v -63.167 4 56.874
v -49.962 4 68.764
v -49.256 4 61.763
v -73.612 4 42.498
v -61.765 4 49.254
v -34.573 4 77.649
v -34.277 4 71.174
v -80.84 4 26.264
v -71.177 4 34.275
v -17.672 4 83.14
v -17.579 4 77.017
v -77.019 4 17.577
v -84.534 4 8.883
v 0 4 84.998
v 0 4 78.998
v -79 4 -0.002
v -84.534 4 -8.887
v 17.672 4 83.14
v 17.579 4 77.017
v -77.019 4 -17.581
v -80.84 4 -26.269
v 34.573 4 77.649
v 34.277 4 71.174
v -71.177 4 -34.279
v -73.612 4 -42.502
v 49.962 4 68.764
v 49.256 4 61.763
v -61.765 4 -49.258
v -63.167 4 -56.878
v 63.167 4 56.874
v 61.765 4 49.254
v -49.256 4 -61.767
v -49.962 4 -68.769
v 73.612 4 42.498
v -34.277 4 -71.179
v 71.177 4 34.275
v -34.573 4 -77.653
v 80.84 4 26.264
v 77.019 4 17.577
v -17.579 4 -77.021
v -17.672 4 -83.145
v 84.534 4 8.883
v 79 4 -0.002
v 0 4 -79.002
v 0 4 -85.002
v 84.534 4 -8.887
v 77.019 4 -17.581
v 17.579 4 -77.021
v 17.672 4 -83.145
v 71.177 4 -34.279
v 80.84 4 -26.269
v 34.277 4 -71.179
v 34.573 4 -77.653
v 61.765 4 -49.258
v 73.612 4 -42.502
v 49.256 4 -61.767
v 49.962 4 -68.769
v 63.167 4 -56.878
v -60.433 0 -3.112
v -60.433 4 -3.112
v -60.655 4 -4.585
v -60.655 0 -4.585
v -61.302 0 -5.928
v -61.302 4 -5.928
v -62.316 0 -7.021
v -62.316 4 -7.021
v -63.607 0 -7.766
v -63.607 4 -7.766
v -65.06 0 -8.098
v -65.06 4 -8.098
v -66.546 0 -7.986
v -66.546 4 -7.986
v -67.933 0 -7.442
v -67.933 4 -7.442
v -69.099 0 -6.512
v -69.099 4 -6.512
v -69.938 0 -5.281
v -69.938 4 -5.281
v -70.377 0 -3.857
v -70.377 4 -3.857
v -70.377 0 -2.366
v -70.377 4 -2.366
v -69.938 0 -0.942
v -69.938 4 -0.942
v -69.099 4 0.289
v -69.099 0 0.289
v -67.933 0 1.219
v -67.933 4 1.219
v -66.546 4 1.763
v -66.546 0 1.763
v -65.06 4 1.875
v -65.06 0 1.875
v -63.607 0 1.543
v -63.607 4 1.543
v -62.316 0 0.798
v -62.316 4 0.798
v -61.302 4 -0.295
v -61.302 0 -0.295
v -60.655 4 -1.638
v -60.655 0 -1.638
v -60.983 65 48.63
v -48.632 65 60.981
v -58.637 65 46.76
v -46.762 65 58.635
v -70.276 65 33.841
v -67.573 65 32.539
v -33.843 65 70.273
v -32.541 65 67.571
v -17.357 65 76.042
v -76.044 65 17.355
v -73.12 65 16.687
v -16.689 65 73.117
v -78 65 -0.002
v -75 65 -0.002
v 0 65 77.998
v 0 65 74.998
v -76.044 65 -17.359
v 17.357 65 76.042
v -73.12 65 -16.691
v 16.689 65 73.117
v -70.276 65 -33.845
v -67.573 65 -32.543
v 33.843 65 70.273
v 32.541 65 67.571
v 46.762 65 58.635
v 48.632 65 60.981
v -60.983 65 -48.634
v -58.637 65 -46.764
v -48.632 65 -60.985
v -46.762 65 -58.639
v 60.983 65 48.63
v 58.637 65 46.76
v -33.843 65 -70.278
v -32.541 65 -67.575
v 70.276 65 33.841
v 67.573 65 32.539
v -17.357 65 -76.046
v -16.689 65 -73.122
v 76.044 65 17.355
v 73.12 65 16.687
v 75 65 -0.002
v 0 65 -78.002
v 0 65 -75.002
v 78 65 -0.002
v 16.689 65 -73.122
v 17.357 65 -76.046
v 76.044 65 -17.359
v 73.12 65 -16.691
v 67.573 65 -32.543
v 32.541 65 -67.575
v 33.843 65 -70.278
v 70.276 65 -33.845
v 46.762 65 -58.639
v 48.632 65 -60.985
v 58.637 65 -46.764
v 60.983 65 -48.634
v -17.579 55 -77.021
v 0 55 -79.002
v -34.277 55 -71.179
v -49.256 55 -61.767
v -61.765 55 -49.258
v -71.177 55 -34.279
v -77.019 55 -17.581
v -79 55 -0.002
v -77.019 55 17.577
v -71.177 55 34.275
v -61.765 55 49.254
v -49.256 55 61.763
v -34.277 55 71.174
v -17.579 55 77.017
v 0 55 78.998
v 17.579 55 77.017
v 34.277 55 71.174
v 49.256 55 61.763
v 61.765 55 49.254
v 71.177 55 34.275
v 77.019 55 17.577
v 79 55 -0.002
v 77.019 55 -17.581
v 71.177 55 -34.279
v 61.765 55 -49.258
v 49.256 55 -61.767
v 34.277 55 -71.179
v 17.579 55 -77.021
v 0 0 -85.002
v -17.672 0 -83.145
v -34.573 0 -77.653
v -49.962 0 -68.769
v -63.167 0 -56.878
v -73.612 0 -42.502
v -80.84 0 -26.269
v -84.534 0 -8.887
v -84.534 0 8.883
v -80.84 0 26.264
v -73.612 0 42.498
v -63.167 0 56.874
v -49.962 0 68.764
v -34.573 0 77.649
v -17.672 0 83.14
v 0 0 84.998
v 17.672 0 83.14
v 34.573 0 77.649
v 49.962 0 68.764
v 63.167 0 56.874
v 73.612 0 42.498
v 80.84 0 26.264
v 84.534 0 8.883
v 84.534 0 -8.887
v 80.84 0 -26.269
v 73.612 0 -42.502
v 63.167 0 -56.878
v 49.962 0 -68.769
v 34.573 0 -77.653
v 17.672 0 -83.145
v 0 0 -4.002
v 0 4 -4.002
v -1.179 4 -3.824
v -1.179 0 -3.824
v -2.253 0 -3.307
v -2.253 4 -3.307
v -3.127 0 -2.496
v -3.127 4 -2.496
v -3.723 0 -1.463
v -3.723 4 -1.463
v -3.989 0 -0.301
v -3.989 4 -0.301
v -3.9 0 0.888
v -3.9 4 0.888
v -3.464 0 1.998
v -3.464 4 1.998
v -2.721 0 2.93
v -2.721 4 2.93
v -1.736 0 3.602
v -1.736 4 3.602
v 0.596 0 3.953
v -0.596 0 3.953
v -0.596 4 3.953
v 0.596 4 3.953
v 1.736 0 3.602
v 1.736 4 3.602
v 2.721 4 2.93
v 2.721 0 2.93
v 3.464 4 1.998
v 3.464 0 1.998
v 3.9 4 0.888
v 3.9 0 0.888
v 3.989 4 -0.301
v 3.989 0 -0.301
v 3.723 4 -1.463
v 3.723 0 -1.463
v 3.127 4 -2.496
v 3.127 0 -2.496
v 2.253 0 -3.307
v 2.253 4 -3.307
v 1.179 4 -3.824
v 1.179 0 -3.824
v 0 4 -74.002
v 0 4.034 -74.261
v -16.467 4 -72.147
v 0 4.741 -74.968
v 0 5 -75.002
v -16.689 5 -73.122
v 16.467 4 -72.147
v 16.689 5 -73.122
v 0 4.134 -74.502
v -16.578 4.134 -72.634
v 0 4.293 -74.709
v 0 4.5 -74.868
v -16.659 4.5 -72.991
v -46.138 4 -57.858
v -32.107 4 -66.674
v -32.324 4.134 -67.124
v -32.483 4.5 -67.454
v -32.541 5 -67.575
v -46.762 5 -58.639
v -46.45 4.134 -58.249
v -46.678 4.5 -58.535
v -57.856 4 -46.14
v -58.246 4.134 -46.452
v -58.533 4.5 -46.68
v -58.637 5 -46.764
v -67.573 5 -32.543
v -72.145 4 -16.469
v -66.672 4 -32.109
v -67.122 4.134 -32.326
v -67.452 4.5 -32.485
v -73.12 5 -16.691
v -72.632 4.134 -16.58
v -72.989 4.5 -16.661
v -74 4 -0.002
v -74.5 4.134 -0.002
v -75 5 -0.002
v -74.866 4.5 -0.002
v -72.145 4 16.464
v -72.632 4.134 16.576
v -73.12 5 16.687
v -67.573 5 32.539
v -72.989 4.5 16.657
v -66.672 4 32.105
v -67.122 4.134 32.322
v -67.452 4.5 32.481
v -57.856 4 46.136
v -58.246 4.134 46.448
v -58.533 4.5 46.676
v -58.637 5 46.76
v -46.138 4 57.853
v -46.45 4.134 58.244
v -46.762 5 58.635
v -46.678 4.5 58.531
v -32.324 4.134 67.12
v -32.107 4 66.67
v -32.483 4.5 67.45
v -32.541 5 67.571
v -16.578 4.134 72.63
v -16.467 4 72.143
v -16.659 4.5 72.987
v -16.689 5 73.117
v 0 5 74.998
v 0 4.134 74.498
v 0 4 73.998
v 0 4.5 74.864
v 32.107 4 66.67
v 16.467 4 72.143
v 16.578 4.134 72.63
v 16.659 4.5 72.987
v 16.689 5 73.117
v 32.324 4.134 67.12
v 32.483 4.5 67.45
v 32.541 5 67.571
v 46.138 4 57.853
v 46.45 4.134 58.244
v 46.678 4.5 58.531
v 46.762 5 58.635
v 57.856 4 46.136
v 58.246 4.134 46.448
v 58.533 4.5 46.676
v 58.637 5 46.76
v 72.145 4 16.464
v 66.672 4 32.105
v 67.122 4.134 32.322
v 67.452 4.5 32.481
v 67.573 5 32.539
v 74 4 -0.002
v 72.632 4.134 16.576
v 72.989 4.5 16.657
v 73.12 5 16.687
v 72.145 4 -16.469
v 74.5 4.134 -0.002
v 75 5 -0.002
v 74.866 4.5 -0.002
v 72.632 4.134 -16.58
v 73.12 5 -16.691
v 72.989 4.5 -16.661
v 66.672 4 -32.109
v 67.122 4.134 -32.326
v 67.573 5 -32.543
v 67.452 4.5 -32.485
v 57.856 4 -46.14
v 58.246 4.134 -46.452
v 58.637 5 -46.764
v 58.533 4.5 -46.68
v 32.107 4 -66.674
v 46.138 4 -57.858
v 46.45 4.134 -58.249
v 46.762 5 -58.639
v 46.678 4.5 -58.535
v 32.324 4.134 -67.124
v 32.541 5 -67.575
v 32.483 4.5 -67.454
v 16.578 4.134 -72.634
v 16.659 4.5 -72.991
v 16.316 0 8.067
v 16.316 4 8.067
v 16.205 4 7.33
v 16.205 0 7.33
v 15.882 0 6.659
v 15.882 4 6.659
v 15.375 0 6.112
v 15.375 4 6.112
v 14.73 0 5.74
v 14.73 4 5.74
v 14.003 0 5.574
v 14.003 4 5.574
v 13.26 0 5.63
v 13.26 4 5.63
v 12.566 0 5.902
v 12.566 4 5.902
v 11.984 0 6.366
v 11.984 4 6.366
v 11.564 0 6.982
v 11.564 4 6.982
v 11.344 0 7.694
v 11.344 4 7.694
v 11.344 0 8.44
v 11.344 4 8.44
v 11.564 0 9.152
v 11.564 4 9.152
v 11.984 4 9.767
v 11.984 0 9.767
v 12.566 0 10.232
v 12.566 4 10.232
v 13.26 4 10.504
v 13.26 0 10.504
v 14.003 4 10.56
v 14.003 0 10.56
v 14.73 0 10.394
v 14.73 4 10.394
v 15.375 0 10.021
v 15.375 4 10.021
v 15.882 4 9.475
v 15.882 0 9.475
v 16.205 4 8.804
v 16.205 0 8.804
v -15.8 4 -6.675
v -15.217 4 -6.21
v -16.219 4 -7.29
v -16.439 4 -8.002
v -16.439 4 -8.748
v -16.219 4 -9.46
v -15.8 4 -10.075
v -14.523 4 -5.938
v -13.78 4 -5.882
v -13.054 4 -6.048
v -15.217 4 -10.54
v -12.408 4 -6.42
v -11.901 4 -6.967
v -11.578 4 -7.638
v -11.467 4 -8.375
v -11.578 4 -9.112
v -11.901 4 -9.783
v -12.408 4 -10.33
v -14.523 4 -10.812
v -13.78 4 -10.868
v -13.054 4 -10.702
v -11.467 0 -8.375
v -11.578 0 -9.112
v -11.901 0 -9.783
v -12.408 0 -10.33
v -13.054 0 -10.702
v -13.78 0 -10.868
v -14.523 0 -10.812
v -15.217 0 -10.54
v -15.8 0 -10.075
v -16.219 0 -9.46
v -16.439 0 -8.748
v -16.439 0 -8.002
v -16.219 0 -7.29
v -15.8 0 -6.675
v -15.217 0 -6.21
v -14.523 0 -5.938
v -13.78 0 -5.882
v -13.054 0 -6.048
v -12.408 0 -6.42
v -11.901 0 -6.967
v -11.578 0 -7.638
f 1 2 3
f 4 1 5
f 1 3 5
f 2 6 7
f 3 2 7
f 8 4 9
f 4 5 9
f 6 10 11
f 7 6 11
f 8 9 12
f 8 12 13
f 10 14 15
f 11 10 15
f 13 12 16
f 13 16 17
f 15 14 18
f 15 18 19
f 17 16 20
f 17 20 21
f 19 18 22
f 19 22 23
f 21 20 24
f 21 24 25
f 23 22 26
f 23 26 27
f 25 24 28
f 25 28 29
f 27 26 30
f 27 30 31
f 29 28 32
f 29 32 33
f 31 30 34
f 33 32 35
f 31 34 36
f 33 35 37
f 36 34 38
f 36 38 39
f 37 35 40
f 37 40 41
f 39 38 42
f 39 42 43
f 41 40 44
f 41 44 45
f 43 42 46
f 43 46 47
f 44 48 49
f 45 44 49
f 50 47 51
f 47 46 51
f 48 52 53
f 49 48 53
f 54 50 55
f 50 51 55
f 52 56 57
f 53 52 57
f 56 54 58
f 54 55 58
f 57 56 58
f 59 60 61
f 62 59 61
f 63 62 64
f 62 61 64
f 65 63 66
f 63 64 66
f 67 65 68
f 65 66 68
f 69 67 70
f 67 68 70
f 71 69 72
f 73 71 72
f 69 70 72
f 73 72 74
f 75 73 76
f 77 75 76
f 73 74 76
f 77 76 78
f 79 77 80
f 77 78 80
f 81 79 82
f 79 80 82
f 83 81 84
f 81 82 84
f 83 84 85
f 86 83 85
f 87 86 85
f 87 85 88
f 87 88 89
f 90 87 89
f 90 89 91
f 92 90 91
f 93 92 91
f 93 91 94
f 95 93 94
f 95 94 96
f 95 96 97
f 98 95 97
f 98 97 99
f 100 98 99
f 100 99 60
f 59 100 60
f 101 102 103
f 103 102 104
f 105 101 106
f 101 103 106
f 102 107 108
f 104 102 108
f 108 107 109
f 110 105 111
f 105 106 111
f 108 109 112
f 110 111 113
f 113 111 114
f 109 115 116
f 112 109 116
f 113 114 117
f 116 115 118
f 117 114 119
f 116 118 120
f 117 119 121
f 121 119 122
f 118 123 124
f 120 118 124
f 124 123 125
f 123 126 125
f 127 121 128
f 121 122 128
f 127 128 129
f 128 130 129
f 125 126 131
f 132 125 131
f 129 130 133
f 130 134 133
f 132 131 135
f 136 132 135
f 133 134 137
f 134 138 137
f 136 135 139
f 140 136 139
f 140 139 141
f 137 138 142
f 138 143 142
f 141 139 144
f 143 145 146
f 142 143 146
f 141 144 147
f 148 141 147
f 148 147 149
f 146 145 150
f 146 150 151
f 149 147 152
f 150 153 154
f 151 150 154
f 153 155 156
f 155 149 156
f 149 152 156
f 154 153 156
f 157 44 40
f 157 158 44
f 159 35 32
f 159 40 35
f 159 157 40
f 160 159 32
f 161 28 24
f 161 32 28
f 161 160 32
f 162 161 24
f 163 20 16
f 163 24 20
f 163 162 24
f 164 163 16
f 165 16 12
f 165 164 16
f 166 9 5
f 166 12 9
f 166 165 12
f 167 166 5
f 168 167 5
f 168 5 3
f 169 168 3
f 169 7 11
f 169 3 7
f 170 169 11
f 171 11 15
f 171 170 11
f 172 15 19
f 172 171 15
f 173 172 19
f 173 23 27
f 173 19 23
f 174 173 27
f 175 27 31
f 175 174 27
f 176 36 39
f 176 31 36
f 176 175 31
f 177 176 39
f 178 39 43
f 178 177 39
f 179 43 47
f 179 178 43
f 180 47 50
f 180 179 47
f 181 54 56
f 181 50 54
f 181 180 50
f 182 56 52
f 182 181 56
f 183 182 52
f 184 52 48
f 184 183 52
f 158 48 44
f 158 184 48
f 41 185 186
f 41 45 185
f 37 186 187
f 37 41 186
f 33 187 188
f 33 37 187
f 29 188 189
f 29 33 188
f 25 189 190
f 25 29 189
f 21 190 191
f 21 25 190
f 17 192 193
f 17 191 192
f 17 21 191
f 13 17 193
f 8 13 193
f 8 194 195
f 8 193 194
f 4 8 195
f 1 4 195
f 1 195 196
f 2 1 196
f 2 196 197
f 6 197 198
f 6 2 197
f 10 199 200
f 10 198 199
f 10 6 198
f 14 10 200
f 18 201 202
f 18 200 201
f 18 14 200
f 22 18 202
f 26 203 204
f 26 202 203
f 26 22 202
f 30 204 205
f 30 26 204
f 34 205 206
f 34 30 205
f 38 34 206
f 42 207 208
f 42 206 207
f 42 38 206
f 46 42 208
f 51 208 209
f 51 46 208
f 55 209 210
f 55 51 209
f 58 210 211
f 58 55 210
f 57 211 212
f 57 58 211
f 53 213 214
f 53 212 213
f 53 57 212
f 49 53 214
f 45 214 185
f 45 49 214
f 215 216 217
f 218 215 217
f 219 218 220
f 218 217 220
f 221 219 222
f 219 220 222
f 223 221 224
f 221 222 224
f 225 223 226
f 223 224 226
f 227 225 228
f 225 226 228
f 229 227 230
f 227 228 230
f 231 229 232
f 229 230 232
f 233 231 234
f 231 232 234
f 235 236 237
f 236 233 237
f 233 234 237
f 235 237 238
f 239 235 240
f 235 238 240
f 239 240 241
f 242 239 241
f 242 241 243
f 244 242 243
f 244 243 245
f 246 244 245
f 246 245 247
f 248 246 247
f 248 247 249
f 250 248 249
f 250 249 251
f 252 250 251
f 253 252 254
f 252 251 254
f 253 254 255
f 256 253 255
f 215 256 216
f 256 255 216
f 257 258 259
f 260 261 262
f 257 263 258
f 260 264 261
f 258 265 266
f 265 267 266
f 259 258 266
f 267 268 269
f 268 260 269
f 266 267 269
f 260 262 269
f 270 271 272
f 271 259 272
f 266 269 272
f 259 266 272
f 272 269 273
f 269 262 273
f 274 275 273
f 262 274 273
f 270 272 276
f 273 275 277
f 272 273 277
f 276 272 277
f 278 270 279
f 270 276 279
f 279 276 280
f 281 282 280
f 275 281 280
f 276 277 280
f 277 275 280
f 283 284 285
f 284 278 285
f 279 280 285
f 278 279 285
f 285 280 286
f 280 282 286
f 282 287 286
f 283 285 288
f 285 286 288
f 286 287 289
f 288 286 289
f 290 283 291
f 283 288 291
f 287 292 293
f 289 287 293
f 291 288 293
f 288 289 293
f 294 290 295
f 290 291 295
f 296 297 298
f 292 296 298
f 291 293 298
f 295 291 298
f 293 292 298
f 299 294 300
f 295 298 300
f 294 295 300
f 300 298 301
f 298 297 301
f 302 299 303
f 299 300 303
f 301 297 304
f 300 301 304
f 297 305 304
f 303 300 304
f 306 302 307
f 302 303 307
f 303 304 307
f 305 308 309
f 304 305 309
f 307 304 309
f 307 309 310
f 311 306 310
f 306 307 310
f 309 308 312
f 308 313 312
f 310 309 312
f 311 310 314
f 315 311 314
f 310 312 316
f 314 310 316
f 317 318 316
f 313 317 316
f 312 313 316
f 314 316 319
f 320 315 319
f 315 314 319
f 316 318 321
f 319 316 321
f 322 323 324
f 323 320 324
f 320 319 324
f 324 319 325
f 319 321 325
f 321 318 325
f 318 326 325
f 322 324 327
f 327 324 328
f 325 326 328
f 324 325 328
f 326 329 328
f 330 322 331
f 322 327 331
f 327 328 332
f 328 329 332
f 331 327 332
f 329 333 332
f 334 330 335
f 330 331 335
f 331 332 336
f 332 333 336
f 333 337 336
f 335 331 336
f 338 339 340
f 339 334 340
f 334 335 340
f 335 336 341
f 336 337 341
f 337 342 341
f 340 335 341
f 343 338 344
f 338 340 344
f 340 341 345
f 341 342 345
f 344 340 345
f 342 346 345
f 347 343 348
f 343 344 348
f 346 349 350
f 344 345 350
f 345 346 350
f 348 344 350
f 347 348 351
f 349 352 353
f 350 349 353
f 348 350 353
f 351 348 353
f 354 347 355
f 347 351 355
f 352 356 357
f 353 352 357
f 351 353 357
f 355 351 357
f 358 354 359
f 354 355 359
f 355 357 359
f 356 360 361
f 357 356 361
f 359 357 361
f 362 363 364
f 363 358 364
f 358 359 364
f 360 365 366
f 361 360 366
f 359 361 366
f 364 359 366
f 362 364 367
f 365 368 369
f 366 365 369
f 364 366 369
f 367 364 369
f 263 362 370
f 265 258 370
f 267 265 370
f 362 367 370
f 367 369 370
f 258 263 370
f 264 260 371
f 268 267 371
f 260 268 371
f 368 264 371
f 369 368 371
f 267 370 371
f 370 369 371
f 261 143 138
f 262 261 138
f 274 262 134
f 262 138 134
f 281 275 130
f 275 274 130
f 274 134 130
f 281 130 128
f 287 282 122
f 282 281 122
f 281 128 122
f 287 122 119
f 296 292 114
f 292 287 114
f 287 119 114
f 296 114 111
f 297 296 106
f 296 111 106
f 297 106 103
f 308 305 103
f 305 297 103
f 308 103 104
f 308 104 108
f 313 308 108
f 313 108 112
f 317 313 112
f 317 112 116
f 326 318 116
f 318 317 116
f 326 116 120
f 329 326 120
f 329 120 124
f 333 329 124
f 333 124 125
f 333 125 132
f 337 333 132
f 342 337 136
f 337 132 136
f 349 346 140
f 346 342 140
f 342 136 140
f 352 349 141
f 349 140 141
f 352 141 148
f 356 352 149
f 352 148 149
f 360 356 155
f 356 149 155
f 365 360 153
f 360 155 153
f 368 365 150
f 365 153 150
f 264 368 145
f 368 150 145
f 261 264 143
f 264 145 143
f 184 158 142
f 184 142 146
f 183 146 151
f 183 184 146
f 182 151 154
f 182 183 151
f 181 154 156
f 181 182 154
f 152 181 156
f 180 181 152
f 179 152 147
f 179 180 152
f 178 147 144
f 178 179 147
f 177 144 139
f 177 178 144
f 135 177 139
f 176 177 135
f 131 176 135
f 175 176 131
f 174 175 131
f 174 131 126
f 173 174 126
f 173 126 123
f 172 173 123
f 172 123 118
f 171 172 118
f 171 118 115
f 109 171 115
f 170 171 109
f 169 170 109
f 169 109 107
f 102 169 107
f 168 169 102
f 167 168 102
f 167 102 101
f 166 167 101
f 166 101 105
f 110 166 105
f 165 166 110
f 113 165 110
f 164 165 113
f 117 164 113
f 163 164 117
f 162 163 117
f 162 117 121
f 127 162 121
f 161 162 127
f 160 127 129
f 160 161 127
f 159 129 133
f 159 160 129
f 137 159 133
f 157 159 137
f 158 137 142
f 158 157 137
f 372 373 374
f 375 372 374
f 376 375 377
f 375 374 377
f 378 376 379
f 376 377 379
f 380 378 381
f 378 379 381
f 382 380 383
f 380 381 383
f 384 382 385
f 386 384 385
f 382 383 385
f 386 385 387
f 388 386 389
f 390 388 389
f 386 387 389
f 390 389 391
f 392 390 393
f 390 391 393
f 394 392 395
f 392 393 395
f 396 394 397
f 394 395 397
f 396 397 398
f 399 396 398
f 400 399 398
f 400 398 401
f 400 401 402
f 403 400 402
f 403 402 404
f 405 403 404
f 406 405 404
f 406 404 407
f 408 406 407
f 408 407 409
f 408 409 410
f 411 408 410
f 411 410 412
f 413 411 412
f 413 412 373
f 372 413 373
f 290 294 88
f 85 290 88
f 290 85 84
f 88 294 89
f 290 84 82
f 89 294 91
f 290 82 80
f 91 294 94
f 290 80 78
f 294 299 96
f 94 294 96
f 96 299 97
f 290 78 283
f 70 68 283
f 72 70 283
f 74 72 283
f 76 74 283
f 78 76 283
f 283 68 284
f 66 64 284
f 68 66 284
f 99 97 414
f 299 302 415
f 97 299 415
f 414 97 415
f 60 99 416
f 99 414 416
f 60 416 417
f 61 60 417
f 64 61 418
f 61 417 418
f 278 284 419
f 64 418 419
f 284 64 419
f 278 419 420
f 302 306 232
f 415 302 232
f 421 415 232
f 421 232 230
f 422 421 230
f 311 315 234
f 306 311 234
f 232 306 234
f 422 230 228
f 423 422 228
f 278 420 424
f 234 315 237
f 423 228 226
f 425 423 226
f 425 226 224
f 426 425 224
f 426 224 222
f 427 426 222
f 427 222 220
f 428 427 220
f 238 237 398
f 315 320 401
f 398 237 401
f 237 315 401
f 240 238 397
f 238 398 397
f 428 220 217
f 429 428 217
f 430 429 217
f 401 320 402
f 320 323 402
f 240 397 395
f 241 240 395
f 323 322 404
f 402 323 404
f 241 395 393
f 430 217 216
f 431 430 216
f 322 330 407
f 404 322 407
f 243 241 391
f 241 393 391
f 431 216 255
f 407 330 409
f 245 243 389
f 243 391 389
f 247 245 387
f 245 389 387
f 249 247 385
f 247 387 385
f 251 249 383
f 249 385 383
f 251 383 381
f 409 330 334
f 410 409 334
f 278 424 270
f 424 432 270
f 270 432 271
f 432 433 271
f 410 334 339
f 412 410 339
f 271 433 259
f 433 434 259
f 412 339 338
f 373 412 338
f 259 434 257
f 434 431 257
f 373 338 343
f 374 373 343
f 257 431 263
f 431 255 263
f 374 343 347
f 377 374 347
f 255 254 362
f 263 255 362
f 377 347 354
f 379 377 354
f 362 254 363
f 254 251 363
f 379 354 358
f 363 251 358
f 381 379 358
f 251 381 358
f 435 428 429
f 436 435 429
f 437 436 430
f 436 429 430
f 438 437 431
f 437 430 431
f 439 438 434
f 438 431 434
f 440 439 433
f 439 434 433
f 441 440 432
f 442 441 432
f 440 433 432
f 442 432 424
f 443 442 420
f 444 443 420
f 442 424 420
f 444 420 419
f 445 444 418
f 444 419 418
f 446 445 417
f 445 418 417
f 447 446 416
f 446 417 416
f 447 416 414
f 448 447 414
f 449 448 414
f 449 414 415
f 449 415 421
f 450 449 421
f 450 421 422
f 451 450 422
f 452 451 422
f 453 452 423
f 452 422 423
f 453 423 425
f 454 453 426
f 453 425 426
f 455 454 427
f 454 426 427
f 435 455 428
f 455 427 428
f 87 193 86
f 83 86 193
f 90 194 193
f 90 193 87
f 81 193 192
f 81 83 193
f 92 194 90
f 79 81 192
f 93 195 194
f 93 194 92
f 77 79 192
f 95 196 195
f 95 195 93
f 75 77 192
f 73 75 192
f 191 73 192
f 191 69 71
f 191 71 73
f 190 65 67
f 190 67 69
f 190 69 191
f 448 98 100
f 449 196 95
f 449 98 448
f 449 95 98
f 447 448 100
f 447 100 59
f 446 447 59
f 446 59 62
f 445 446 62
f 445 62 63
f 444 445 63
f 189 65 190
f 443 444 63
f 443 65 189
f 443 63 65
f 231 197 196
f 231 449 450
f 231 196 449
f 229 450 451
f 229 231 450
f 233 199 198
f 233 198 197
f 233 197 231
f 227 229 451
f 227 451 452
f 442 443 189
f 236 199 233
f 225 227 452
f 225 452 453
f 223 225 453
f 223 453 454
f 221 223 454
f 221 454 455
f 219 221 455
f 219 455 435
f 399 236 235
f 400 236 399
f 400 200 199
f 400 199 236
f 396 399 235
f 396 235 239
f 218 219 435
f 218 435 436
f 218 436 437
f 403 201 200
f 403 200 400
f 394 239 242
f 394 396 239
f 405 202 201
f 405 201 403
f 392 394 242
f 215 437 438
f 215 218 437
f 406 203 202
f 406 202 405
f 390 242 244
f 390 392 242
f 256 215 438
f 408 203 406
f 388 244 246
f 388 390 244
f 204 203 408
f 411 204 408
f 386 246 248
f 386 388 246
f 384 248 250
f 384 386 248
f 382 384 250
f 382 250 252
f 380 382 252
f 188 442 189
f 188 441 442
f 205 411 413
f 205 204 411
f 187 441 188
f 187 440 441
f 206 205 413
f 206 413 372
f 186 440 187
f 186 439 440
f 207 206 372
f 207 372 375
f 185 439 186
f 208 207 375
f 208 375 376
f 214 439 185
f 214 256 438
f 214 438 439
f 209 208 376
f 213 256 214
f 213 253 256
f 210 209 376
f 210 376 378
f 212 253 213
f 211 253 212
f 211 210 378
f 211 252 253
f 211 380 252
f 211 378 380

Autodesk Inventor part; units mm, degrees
ref_plane "YZ Plane" through (0, 0, 0) normal (1, 0, 0) x (0, 1, 0)
ref_plane "XZ Plane" through (0, 0, 0) normal (0, 1, 0) x (-1, 0, 0)
ref_plane "XY Plane" through (0, 0, 0) normal (0, 0, 1) x (1, 0, 0)
sketch "Эскиз2" plane through (0, 0, 0) normal (1, 0, 0) x (0, 1, 0)
  line L0 (0, 16.9979) -> (0, -102.0021) projected
  line L1 (18.2354, -0.0021) -> (-21.7975, -0.0021) construction
  line L2 (0, -85.0021) -> (4, -85.0021)
  line L3 (4, -85.0021) -> (4, -79.0021)
  line L4 (4, -75.0021) -> (65, -75.0021)
  line L5 (65, -75.0021) -> (65, -78.0021)
  line L6 (65, -79.0021) -> (65, -75.0021) construction
  line L7 (4, -79.0021) -> (55, -79.0021)
  line L8 (55, -79.0021) -> (65, -78.0021)
  line L9 (4, -75.0021) -> (4, -4.0021)
  line L10 (0, -85.0021) -> (0, -4.0021)
  line L11 (0, -4.0021) -> (4, -4.0021)
  point P0 (0, -0.0021)
  point P1 (4, -0.0021)
  dimension "d1" = 4
  dimension "d2" = 6
  dimension "d3" = 61
  dimension "d6" = 3
  dimension "d7" = 51
  dimension "d8" = 4
revolve "Вращение1" add sketch "Эскиз2" angle 360 about axis through (0, 18.2354, -0.0021) along (0, -1, 0)
fillet "Сопряжение1" radius 1 1 edges at (0, 4, 74.9979)
sketch "Эскиз3" plane through (0, 4, -0.0021) normal (0, 1, 0) x (1, 0, 0)
  ellipse E0 centre (-13.967, 8.3729) end of major axis (-13.9806, 5.1229) minor radius 3.25 construction
  circle A0 centre (13.8163, -8.069) radius 3.25 construction
  circle A1 centre (13.8163, -8.069) radius 2.5 projected
  circle A2 centre (-13.967, 8.3729) radius 2.5 projected
  arc A3 (-64.2334, 5.859) -> (-62.6955, 4.3359) centre (-65.4333, 3.1094) ccw projected
  circle A4 centre (-65.4333, 3.1094) radius 5
  point P0 (0, -0.0021)
  dimension "d14" = 10
extrude "Выдавливание1" cut sketch "Эскиз3" against normal blind 10
properties part number "Cap_pipes"
